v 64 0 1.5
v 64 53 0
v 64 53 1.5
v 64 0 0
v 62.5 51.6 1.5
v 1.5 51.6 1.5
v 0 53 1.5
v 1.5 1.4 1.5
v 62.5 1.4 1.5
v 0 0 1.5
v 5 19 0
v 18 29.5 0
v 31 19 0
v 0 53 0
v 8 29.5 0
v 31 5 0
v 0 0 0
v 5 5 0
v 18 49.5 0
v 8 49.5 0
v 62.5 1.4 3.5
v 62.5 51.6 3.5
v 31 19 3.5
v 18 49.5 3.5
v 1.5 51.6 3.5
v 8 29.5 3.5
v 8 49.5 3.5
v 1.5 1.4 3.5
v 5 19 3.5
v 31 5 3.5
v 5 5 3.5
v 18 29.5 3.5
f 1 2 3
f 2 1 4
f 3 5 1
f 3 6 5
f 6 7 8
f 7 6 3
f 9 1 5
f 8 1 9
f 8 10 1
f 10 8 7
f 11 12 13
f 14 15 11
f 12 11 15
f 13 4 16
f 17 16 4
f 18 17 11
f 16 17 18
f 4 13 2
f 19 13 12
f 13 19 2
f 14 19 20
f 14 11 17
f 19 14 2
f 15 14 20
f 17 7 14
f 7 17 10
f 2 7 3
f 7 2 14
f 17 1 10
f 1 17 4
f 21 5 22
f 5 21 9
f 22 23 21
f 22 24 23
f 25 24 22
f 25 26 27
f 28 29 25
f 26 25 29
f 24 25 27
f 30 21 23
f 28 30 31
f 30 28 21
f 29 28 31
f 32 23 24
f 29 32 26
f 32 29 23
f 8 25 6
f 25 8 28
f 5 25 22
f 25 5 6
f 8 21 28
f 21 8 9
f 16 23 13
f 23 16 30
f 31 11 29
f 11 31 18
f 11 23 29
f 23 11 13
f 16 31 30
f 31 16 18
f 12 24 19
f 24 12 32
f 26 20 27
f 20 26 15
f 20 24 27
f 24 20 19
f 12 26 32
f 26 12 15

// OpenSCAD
Wall   = 1.5; // Wall thickness
//Inner Widths
Length = 61+Wall*2; // X axis
Width  = 50+Wall*2; // Y
Height = 9; // Z


//difference(){
//  cube([Length,Width,Height]);  
//  translate([Wall,Wall,Wall]) {
//    cube([Length-(Wall*2),Width-(Wall*2),Height]);
//  }
//
//
//}


LidHeight = 1.5;
difference() {
union(){
  cube([Length,Width,LidHeight]);  
  
  translate([Wall,Wall-.1,Wall]) {
    cube([Length-(Wall*2),Width-(Wall*2)+.2,2]);
  }
}
translate([5,5,0]) cube([31-5,19-5,10]);

translate([8,29.5,0]) cube([10,20,10]);
}
